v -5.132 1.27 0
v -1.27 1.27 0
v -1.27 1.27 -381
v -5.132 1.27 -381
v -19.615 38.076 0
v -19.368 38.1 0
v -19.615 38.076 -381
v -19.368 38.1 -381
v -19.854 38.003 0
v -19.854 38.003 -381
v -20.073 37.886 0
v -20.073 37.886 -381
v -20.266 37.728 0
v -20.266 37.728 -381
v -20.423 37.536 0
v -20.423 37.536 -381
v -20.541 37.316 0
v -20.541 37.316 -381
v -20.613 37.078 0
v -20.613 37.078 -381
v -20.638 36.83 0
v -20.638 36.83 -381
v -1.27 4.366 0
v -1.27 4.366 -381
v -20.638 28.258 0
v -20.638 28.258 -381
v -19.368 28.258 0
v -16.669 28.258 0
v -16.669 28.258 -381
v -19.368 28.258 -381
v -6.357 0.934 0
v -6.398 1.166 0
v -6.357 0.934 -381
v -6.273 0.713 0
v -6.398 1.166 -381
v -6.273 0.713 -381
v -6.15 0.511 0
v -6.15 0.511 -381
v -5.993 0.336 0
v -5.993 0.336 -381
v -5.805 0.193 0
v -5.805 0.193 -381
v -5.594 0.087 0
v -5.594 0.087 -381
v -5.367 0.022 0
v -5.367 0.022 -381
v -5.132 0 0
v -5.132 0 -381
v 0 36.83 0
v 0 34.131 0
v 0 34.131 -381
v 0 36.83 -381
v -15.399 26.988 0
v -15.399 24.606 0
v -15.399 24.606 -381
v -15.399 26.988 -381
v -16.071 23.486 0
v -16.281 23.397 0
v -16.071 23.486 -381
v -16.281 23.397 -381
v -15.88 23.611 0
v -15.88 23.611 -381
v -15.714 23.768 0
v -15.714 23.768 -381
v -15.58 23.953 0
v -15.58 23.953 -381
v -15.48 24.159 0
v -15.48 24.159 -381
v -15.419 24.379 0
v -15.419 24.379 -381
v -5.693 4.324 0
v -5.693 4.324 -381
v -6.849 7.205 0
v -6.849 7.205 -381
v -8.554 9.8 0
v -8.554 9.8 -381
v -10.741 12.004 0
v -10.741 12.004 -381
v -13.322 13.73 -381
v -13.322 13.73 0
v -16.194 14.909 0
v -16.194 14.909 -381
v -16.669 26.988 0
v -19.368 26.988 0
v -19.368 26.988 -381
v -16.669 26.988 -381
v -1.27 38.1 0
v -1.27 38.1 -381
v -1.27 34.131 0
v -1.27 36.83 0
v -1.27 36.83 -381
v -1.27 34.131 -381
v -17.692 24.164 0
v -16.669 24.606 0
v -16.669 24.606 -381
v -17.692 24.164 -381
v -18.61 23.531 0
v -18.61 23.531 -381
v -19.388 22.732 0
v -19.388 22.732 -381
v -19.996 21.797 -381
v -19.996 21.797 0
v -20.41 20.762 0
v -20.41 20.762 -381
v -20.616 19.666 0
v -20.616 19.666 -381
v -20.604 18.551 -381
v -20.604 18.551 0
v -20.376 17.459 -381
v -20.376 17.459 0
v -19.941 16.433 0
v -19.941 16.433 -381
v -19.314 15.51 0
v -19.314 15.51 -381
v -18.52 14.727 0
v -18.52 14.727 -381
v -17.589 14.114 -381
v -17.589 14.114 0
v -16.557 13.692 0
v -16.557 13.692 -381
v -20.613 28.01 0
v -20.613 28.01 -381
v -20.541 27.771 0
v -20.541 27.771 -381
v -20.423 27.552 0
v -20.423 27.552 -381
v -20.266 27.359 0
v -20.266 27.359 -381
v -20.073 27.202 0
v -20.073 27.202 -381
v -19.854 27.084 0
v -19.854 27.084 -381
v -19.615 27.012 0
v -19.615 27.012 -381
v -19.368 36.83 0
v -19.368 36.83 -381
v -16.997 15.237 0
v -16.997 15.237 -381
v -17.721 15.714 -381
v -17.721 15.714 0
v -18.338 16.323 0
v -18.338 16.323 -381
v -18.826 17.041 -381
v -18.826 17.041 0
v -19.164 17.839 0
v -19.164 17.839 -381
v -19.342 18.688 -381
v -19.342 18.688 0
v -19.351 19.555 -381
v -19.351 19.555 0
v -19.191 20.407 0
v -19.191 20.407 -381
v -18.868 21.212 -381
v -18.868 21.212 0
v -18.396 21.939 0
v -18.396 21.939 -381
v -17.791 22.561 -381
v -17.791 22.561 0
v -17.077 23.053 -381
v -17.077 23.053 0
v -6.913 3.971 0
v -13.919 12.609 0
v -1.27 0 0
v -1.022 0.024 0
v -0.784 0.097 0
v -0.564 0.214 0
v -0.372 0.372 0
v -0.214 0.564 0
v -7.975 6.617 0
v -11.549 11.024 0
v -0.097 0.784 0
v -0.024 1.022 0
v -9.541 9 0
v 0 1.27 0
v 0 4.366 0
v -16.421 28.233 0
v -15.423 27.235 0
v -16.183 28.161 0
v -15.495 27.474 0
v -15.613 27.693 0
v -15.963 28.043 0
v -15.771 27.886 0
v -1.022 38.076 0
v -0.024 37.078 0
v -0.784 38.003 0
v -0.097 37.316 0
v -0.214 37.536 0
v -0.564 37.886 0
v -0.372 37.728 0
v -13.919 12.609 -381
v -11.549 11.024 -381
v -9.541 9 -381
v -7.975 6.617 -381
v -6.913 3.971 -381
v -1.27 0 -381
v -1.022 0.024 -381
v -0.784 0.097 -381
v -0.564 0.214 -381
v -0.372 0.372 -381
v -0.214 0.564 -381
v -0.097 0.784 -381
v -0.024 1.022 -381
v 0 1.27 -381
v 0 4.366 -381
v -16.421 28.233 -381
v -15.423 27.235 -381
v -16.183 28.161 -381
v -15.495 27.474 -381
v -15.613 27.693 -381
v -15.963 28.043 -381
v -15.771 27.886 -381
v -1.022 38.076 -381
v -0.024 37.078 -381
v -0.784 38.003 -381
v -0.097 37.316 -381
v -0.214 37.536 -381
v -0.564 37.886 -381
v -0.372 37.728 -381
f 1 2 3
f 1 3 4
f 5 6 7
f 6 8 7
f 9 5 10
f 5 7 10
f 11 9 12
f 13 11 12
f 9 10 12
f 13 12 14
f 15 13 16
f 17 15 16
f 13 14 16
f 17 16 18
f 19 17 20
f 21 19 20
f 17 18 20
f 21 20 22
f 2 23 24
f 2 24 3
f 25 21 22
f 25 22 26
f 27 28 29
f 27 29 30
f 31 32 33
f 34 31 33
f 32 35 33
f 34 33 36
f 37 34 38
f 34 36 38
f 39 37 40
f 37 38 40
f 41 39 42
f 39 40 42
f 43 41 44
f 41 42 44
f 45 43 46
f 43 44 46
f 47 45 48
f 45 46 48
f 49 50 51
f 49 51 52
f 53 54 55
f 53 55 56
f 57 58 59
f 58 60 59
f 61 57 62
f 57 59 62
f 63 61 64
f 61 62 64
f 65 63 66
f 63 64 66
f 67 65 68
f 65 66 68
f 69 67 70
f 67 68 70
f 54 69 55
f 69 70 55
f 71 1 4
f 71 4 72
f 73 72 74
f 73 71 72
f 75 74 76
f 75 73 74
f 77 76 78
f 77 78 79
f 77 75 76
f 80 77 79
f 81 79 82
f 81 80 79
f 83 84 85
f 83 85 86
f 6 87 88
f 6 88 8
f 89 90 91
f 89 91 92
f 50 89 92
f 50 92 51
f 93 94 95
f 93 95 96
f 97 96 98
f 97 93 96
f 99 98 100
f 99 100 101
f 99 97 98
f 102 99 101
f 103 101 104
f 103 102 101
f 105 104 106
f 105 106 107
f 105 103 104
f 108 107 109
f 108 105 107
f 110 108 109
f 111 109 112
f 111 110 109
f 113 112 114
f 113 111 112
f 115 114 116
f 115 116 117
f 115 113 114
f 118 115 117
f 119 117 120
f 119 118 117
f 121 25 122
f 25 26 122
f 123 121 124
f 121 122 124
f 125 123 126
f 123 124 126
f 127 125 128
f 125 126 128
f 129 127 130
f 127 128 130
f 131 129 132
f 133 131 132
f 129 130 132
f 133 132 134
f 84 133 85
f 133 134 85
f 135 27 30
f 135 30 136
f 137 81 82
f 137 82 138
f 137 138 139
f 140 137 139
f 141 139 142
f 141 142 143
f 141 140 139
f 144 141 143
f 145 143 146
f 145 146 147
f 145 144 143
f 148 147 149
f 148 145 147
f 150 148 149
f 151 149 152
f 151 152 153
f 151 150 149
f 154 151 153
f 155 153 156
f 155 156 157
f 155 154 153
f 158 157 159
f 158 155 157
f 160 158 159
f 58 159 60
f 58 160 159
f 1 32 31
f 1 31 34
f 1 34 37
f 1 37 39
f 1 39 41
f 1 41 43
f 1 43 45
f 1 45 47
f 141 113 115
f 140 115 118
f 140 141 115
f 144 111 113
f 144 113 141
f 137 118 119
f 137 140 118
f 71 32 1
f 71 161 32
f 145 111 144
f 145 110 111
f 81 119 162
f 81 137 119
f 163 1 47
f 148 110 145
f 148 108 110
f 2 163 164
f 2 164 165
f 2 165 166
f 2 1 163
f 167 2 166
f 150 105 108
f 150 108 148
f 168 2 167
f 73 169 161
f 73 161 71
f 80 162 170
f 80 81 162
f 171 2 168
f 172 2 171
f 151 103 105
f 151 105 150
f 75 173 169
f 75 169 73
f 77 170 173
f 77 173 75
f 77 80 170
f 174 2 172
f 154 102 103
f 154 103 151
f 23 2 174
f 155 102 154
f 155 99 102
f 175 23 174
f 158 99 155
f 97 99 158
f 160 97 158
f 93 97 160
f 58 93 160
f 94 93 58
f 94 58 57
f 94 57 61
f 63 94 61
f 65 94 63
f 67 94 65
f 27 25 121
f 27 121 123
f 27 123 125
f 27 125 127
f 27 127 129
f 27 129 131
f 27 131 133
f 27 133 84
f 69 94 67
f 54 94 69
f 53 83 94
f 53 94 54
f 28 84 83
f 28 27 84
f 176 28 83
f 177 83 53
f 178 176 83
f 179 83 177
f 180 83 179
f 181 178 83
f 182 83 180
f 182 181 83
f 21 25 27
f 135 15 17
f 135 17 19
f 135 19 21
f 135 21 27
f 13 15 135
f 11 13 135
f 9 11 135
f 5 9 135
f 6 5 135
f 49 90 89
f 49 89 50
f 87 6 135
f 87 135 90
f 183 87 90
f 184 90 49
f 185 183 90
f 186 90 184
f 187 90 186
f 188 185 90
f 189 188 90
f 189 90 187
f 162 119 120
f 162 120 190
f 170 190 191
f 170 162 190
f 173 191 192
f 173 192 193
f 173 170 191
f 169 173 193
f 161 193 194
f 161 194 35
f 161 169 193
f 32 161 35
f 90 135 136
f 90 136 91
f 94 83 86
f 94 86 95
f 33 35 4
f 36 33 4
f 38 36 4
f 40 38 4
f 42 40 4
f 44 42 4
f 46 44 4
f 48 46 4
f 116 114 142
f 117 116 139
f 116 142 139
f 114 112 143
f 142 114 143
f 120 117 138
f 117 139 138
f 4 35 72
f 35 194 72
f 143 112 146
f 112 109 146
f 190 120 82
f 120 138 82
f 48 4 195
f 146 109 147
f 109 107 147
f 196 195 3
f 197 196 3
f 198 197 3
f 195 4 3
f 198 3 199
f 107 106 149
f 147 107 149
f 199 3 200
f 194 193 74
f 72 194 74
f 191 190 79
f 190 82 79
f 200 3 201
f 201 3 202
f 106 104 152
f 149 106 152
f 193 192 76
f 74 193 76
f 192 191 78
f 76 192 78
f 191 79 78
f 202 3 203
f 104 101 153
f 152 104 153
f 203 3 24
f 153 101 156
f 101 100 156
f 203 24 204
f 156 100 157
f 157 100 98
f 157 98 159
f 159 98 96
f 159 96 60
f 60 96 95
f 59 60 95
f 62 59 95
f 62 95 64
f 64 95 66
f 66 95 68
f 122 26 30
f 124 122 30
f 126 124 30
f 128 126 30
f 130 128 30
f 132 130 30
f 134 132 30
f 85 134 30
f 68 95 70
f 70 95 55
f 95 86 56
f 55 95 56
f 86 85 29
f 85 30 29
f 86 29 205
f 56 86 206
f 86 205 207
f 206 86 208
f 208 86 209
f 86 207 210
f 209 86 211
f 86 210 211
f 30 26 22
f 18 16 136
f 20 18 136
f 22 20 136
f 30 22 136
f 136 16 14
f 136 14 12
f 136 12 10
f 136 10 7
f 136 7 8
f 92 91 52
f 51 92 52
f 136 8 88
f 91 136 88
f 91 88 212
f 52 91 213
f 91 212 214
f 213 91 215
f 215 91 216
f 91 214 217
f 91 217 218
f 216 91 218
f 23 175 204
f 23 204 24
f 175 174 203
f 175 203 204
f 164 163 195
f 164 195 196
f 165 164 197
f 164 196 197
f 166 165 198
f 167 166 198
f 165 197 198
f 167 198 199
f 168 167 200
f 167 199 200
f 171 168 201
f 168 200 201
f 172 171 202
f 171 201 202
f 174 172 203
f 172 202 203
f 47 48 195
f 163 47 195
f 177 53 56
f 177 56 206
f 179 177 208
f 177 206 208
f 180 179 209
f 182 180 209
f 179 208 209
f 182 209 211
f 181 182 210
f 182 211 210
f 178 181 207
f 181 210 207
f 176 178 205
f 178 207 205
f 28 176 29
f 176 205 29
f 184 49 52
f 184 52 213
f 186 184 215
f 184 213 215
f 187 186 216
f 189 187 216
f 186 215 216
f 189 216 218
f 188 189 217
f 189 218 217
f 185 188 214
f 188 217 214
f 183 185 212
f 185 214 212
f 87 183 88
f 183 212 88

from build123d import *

# Parameters (mm, degrees)
EXTRUDE_THIN1_DEPTH = 381
FILLET1_R           = 1.27


with BuildPart() as part:
    # Sketch1 → Extrude-Thin1 (new body)
    with BuildSketch(Plane.XY):
        with BuildLine():
            Line((0, 34.13125), (0, 38.1))
            Line((0, 38.1), (-20.6375, 38.1))
            Line((-20.6375, 38.1), (-20.6375, 26.9875))
            Line((-20.6375, 26.9875), (-16.66875, 26.9875))
            Line((-16.66875, 26.9875), (-16.66875, 24.60625))
            ThreePointArc((-16.66875, 24.60625), (-20.637199415, 19.108011605), (-16.556782099, 13.692348143))
            ThreePointArc((-16.556782099, 13.692348143), (-9.182459335, 8.539010459), (-6.35, 0))
            Line((-6.35, 0), (0, 0))
            Line((0, 0), (0, 4.365625))
            Line((0, 4.365625), (-1.27, 4.365625))
            Line((-1.27, 4.365625), (-1.27, 1.27))
            Line((-1.27, 1.27), (-5.131923382, 1.27))
            ThreePointArc((-5.131923382, 1.27), (-8.5544739, 9.799810535), (-16.194051619, 14.909445755))
            ThreePointArc((-16.194051619, 14.909445755), (-19.348945082, 19.572203738), (-15.39875, 23.58351569))
            Line((-15.39875, 23.58351569), (-15.39875, 28.2575))
            Line((-15.39875, 28.2575), (-19.3675, 28.2575))
            Line((-19.3675, 28.2575), (-19.3675, 36.83))
            Line((-19.3675, 36.83), (-1.27, 36.83))
            Line((-1.27, 36.83), (-1.27, 34.13125))
            Line((-1.27, 34.13125), (0, 34.13125))
        make_face()
    extrude(amount=-EXTRUDE_THIN1_DEPTH)

    # Fillet1
    fillet1_edges = [part.edges().sort_by_distance(p)[0] for p in [
        (0, 0, -190.5),
        (-6.35, 0, -190.5),
        (-20.6375, 26.9875, -190.5),
        (-20.6375, 38.1, -190.5),
        (0, 38.1, -190.5),
        (-15.39875, 28.2575, -190.5),
        (-15.39875, 23.58351569, -190.5),
    ]]
    fillet(fillet1_edges, radius=FILLET1_R)


solid = part.part
